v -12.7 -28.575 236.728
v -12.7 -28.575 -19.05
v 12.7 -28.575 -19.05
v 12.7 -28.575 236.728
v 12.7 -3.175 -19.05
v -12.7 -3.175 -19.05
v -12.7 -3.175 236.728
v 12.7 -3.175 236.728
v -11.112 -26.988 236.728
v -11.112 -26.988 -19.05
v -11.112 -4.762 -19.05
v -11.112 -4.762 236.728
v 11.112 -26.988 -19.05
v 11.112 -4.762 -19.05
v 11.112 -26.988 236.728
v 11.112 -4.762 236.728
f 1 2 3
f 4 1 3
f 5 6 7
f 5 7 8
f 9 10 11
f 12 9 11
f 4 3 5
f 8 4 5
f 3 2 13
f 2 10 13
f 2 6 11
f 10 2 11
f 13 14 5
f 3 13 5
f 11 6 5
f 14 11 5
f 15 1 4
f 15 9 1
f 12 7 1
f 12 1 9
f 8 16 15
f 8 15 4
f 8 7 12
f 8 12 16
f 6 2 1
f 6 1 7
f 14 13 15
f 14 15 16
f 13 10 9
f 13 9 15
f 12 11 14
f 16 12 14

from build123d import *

# Parameters (mm, degrees)
EXTRUDE1_DEPTH      = 236.728
EXTRUDE1_DEPTH_BACK = 19.05
SKETCH1_W           = 25.4
SKETCH1_H           = 25.4
SKETCH1_W_2         = 22.225
SKETCH1_H_2         = 22.225


with BuildPart() as part:
    # Sketch1 → Extrude1 (new, two sides: drawn at the far end of the back side and taken through both)
    with BuildSketch(Plane.XY.offset(-EXTRUDE1_DEPTH_BACK)):
        with Locations((0, -15.875)):
            Rectangle(SKETCH1_W, SKETCH1_H)
        with Locations((0, -15.875)):
            Rectangle(SKETCH1_W_2, SKETCH1_H_2, mode=Mode.SUBTRACT)
    extrude(amount=EXTRUDE1_DEPTH + EXTRUDE1_DEPTH_BACK)


solid = part.part
